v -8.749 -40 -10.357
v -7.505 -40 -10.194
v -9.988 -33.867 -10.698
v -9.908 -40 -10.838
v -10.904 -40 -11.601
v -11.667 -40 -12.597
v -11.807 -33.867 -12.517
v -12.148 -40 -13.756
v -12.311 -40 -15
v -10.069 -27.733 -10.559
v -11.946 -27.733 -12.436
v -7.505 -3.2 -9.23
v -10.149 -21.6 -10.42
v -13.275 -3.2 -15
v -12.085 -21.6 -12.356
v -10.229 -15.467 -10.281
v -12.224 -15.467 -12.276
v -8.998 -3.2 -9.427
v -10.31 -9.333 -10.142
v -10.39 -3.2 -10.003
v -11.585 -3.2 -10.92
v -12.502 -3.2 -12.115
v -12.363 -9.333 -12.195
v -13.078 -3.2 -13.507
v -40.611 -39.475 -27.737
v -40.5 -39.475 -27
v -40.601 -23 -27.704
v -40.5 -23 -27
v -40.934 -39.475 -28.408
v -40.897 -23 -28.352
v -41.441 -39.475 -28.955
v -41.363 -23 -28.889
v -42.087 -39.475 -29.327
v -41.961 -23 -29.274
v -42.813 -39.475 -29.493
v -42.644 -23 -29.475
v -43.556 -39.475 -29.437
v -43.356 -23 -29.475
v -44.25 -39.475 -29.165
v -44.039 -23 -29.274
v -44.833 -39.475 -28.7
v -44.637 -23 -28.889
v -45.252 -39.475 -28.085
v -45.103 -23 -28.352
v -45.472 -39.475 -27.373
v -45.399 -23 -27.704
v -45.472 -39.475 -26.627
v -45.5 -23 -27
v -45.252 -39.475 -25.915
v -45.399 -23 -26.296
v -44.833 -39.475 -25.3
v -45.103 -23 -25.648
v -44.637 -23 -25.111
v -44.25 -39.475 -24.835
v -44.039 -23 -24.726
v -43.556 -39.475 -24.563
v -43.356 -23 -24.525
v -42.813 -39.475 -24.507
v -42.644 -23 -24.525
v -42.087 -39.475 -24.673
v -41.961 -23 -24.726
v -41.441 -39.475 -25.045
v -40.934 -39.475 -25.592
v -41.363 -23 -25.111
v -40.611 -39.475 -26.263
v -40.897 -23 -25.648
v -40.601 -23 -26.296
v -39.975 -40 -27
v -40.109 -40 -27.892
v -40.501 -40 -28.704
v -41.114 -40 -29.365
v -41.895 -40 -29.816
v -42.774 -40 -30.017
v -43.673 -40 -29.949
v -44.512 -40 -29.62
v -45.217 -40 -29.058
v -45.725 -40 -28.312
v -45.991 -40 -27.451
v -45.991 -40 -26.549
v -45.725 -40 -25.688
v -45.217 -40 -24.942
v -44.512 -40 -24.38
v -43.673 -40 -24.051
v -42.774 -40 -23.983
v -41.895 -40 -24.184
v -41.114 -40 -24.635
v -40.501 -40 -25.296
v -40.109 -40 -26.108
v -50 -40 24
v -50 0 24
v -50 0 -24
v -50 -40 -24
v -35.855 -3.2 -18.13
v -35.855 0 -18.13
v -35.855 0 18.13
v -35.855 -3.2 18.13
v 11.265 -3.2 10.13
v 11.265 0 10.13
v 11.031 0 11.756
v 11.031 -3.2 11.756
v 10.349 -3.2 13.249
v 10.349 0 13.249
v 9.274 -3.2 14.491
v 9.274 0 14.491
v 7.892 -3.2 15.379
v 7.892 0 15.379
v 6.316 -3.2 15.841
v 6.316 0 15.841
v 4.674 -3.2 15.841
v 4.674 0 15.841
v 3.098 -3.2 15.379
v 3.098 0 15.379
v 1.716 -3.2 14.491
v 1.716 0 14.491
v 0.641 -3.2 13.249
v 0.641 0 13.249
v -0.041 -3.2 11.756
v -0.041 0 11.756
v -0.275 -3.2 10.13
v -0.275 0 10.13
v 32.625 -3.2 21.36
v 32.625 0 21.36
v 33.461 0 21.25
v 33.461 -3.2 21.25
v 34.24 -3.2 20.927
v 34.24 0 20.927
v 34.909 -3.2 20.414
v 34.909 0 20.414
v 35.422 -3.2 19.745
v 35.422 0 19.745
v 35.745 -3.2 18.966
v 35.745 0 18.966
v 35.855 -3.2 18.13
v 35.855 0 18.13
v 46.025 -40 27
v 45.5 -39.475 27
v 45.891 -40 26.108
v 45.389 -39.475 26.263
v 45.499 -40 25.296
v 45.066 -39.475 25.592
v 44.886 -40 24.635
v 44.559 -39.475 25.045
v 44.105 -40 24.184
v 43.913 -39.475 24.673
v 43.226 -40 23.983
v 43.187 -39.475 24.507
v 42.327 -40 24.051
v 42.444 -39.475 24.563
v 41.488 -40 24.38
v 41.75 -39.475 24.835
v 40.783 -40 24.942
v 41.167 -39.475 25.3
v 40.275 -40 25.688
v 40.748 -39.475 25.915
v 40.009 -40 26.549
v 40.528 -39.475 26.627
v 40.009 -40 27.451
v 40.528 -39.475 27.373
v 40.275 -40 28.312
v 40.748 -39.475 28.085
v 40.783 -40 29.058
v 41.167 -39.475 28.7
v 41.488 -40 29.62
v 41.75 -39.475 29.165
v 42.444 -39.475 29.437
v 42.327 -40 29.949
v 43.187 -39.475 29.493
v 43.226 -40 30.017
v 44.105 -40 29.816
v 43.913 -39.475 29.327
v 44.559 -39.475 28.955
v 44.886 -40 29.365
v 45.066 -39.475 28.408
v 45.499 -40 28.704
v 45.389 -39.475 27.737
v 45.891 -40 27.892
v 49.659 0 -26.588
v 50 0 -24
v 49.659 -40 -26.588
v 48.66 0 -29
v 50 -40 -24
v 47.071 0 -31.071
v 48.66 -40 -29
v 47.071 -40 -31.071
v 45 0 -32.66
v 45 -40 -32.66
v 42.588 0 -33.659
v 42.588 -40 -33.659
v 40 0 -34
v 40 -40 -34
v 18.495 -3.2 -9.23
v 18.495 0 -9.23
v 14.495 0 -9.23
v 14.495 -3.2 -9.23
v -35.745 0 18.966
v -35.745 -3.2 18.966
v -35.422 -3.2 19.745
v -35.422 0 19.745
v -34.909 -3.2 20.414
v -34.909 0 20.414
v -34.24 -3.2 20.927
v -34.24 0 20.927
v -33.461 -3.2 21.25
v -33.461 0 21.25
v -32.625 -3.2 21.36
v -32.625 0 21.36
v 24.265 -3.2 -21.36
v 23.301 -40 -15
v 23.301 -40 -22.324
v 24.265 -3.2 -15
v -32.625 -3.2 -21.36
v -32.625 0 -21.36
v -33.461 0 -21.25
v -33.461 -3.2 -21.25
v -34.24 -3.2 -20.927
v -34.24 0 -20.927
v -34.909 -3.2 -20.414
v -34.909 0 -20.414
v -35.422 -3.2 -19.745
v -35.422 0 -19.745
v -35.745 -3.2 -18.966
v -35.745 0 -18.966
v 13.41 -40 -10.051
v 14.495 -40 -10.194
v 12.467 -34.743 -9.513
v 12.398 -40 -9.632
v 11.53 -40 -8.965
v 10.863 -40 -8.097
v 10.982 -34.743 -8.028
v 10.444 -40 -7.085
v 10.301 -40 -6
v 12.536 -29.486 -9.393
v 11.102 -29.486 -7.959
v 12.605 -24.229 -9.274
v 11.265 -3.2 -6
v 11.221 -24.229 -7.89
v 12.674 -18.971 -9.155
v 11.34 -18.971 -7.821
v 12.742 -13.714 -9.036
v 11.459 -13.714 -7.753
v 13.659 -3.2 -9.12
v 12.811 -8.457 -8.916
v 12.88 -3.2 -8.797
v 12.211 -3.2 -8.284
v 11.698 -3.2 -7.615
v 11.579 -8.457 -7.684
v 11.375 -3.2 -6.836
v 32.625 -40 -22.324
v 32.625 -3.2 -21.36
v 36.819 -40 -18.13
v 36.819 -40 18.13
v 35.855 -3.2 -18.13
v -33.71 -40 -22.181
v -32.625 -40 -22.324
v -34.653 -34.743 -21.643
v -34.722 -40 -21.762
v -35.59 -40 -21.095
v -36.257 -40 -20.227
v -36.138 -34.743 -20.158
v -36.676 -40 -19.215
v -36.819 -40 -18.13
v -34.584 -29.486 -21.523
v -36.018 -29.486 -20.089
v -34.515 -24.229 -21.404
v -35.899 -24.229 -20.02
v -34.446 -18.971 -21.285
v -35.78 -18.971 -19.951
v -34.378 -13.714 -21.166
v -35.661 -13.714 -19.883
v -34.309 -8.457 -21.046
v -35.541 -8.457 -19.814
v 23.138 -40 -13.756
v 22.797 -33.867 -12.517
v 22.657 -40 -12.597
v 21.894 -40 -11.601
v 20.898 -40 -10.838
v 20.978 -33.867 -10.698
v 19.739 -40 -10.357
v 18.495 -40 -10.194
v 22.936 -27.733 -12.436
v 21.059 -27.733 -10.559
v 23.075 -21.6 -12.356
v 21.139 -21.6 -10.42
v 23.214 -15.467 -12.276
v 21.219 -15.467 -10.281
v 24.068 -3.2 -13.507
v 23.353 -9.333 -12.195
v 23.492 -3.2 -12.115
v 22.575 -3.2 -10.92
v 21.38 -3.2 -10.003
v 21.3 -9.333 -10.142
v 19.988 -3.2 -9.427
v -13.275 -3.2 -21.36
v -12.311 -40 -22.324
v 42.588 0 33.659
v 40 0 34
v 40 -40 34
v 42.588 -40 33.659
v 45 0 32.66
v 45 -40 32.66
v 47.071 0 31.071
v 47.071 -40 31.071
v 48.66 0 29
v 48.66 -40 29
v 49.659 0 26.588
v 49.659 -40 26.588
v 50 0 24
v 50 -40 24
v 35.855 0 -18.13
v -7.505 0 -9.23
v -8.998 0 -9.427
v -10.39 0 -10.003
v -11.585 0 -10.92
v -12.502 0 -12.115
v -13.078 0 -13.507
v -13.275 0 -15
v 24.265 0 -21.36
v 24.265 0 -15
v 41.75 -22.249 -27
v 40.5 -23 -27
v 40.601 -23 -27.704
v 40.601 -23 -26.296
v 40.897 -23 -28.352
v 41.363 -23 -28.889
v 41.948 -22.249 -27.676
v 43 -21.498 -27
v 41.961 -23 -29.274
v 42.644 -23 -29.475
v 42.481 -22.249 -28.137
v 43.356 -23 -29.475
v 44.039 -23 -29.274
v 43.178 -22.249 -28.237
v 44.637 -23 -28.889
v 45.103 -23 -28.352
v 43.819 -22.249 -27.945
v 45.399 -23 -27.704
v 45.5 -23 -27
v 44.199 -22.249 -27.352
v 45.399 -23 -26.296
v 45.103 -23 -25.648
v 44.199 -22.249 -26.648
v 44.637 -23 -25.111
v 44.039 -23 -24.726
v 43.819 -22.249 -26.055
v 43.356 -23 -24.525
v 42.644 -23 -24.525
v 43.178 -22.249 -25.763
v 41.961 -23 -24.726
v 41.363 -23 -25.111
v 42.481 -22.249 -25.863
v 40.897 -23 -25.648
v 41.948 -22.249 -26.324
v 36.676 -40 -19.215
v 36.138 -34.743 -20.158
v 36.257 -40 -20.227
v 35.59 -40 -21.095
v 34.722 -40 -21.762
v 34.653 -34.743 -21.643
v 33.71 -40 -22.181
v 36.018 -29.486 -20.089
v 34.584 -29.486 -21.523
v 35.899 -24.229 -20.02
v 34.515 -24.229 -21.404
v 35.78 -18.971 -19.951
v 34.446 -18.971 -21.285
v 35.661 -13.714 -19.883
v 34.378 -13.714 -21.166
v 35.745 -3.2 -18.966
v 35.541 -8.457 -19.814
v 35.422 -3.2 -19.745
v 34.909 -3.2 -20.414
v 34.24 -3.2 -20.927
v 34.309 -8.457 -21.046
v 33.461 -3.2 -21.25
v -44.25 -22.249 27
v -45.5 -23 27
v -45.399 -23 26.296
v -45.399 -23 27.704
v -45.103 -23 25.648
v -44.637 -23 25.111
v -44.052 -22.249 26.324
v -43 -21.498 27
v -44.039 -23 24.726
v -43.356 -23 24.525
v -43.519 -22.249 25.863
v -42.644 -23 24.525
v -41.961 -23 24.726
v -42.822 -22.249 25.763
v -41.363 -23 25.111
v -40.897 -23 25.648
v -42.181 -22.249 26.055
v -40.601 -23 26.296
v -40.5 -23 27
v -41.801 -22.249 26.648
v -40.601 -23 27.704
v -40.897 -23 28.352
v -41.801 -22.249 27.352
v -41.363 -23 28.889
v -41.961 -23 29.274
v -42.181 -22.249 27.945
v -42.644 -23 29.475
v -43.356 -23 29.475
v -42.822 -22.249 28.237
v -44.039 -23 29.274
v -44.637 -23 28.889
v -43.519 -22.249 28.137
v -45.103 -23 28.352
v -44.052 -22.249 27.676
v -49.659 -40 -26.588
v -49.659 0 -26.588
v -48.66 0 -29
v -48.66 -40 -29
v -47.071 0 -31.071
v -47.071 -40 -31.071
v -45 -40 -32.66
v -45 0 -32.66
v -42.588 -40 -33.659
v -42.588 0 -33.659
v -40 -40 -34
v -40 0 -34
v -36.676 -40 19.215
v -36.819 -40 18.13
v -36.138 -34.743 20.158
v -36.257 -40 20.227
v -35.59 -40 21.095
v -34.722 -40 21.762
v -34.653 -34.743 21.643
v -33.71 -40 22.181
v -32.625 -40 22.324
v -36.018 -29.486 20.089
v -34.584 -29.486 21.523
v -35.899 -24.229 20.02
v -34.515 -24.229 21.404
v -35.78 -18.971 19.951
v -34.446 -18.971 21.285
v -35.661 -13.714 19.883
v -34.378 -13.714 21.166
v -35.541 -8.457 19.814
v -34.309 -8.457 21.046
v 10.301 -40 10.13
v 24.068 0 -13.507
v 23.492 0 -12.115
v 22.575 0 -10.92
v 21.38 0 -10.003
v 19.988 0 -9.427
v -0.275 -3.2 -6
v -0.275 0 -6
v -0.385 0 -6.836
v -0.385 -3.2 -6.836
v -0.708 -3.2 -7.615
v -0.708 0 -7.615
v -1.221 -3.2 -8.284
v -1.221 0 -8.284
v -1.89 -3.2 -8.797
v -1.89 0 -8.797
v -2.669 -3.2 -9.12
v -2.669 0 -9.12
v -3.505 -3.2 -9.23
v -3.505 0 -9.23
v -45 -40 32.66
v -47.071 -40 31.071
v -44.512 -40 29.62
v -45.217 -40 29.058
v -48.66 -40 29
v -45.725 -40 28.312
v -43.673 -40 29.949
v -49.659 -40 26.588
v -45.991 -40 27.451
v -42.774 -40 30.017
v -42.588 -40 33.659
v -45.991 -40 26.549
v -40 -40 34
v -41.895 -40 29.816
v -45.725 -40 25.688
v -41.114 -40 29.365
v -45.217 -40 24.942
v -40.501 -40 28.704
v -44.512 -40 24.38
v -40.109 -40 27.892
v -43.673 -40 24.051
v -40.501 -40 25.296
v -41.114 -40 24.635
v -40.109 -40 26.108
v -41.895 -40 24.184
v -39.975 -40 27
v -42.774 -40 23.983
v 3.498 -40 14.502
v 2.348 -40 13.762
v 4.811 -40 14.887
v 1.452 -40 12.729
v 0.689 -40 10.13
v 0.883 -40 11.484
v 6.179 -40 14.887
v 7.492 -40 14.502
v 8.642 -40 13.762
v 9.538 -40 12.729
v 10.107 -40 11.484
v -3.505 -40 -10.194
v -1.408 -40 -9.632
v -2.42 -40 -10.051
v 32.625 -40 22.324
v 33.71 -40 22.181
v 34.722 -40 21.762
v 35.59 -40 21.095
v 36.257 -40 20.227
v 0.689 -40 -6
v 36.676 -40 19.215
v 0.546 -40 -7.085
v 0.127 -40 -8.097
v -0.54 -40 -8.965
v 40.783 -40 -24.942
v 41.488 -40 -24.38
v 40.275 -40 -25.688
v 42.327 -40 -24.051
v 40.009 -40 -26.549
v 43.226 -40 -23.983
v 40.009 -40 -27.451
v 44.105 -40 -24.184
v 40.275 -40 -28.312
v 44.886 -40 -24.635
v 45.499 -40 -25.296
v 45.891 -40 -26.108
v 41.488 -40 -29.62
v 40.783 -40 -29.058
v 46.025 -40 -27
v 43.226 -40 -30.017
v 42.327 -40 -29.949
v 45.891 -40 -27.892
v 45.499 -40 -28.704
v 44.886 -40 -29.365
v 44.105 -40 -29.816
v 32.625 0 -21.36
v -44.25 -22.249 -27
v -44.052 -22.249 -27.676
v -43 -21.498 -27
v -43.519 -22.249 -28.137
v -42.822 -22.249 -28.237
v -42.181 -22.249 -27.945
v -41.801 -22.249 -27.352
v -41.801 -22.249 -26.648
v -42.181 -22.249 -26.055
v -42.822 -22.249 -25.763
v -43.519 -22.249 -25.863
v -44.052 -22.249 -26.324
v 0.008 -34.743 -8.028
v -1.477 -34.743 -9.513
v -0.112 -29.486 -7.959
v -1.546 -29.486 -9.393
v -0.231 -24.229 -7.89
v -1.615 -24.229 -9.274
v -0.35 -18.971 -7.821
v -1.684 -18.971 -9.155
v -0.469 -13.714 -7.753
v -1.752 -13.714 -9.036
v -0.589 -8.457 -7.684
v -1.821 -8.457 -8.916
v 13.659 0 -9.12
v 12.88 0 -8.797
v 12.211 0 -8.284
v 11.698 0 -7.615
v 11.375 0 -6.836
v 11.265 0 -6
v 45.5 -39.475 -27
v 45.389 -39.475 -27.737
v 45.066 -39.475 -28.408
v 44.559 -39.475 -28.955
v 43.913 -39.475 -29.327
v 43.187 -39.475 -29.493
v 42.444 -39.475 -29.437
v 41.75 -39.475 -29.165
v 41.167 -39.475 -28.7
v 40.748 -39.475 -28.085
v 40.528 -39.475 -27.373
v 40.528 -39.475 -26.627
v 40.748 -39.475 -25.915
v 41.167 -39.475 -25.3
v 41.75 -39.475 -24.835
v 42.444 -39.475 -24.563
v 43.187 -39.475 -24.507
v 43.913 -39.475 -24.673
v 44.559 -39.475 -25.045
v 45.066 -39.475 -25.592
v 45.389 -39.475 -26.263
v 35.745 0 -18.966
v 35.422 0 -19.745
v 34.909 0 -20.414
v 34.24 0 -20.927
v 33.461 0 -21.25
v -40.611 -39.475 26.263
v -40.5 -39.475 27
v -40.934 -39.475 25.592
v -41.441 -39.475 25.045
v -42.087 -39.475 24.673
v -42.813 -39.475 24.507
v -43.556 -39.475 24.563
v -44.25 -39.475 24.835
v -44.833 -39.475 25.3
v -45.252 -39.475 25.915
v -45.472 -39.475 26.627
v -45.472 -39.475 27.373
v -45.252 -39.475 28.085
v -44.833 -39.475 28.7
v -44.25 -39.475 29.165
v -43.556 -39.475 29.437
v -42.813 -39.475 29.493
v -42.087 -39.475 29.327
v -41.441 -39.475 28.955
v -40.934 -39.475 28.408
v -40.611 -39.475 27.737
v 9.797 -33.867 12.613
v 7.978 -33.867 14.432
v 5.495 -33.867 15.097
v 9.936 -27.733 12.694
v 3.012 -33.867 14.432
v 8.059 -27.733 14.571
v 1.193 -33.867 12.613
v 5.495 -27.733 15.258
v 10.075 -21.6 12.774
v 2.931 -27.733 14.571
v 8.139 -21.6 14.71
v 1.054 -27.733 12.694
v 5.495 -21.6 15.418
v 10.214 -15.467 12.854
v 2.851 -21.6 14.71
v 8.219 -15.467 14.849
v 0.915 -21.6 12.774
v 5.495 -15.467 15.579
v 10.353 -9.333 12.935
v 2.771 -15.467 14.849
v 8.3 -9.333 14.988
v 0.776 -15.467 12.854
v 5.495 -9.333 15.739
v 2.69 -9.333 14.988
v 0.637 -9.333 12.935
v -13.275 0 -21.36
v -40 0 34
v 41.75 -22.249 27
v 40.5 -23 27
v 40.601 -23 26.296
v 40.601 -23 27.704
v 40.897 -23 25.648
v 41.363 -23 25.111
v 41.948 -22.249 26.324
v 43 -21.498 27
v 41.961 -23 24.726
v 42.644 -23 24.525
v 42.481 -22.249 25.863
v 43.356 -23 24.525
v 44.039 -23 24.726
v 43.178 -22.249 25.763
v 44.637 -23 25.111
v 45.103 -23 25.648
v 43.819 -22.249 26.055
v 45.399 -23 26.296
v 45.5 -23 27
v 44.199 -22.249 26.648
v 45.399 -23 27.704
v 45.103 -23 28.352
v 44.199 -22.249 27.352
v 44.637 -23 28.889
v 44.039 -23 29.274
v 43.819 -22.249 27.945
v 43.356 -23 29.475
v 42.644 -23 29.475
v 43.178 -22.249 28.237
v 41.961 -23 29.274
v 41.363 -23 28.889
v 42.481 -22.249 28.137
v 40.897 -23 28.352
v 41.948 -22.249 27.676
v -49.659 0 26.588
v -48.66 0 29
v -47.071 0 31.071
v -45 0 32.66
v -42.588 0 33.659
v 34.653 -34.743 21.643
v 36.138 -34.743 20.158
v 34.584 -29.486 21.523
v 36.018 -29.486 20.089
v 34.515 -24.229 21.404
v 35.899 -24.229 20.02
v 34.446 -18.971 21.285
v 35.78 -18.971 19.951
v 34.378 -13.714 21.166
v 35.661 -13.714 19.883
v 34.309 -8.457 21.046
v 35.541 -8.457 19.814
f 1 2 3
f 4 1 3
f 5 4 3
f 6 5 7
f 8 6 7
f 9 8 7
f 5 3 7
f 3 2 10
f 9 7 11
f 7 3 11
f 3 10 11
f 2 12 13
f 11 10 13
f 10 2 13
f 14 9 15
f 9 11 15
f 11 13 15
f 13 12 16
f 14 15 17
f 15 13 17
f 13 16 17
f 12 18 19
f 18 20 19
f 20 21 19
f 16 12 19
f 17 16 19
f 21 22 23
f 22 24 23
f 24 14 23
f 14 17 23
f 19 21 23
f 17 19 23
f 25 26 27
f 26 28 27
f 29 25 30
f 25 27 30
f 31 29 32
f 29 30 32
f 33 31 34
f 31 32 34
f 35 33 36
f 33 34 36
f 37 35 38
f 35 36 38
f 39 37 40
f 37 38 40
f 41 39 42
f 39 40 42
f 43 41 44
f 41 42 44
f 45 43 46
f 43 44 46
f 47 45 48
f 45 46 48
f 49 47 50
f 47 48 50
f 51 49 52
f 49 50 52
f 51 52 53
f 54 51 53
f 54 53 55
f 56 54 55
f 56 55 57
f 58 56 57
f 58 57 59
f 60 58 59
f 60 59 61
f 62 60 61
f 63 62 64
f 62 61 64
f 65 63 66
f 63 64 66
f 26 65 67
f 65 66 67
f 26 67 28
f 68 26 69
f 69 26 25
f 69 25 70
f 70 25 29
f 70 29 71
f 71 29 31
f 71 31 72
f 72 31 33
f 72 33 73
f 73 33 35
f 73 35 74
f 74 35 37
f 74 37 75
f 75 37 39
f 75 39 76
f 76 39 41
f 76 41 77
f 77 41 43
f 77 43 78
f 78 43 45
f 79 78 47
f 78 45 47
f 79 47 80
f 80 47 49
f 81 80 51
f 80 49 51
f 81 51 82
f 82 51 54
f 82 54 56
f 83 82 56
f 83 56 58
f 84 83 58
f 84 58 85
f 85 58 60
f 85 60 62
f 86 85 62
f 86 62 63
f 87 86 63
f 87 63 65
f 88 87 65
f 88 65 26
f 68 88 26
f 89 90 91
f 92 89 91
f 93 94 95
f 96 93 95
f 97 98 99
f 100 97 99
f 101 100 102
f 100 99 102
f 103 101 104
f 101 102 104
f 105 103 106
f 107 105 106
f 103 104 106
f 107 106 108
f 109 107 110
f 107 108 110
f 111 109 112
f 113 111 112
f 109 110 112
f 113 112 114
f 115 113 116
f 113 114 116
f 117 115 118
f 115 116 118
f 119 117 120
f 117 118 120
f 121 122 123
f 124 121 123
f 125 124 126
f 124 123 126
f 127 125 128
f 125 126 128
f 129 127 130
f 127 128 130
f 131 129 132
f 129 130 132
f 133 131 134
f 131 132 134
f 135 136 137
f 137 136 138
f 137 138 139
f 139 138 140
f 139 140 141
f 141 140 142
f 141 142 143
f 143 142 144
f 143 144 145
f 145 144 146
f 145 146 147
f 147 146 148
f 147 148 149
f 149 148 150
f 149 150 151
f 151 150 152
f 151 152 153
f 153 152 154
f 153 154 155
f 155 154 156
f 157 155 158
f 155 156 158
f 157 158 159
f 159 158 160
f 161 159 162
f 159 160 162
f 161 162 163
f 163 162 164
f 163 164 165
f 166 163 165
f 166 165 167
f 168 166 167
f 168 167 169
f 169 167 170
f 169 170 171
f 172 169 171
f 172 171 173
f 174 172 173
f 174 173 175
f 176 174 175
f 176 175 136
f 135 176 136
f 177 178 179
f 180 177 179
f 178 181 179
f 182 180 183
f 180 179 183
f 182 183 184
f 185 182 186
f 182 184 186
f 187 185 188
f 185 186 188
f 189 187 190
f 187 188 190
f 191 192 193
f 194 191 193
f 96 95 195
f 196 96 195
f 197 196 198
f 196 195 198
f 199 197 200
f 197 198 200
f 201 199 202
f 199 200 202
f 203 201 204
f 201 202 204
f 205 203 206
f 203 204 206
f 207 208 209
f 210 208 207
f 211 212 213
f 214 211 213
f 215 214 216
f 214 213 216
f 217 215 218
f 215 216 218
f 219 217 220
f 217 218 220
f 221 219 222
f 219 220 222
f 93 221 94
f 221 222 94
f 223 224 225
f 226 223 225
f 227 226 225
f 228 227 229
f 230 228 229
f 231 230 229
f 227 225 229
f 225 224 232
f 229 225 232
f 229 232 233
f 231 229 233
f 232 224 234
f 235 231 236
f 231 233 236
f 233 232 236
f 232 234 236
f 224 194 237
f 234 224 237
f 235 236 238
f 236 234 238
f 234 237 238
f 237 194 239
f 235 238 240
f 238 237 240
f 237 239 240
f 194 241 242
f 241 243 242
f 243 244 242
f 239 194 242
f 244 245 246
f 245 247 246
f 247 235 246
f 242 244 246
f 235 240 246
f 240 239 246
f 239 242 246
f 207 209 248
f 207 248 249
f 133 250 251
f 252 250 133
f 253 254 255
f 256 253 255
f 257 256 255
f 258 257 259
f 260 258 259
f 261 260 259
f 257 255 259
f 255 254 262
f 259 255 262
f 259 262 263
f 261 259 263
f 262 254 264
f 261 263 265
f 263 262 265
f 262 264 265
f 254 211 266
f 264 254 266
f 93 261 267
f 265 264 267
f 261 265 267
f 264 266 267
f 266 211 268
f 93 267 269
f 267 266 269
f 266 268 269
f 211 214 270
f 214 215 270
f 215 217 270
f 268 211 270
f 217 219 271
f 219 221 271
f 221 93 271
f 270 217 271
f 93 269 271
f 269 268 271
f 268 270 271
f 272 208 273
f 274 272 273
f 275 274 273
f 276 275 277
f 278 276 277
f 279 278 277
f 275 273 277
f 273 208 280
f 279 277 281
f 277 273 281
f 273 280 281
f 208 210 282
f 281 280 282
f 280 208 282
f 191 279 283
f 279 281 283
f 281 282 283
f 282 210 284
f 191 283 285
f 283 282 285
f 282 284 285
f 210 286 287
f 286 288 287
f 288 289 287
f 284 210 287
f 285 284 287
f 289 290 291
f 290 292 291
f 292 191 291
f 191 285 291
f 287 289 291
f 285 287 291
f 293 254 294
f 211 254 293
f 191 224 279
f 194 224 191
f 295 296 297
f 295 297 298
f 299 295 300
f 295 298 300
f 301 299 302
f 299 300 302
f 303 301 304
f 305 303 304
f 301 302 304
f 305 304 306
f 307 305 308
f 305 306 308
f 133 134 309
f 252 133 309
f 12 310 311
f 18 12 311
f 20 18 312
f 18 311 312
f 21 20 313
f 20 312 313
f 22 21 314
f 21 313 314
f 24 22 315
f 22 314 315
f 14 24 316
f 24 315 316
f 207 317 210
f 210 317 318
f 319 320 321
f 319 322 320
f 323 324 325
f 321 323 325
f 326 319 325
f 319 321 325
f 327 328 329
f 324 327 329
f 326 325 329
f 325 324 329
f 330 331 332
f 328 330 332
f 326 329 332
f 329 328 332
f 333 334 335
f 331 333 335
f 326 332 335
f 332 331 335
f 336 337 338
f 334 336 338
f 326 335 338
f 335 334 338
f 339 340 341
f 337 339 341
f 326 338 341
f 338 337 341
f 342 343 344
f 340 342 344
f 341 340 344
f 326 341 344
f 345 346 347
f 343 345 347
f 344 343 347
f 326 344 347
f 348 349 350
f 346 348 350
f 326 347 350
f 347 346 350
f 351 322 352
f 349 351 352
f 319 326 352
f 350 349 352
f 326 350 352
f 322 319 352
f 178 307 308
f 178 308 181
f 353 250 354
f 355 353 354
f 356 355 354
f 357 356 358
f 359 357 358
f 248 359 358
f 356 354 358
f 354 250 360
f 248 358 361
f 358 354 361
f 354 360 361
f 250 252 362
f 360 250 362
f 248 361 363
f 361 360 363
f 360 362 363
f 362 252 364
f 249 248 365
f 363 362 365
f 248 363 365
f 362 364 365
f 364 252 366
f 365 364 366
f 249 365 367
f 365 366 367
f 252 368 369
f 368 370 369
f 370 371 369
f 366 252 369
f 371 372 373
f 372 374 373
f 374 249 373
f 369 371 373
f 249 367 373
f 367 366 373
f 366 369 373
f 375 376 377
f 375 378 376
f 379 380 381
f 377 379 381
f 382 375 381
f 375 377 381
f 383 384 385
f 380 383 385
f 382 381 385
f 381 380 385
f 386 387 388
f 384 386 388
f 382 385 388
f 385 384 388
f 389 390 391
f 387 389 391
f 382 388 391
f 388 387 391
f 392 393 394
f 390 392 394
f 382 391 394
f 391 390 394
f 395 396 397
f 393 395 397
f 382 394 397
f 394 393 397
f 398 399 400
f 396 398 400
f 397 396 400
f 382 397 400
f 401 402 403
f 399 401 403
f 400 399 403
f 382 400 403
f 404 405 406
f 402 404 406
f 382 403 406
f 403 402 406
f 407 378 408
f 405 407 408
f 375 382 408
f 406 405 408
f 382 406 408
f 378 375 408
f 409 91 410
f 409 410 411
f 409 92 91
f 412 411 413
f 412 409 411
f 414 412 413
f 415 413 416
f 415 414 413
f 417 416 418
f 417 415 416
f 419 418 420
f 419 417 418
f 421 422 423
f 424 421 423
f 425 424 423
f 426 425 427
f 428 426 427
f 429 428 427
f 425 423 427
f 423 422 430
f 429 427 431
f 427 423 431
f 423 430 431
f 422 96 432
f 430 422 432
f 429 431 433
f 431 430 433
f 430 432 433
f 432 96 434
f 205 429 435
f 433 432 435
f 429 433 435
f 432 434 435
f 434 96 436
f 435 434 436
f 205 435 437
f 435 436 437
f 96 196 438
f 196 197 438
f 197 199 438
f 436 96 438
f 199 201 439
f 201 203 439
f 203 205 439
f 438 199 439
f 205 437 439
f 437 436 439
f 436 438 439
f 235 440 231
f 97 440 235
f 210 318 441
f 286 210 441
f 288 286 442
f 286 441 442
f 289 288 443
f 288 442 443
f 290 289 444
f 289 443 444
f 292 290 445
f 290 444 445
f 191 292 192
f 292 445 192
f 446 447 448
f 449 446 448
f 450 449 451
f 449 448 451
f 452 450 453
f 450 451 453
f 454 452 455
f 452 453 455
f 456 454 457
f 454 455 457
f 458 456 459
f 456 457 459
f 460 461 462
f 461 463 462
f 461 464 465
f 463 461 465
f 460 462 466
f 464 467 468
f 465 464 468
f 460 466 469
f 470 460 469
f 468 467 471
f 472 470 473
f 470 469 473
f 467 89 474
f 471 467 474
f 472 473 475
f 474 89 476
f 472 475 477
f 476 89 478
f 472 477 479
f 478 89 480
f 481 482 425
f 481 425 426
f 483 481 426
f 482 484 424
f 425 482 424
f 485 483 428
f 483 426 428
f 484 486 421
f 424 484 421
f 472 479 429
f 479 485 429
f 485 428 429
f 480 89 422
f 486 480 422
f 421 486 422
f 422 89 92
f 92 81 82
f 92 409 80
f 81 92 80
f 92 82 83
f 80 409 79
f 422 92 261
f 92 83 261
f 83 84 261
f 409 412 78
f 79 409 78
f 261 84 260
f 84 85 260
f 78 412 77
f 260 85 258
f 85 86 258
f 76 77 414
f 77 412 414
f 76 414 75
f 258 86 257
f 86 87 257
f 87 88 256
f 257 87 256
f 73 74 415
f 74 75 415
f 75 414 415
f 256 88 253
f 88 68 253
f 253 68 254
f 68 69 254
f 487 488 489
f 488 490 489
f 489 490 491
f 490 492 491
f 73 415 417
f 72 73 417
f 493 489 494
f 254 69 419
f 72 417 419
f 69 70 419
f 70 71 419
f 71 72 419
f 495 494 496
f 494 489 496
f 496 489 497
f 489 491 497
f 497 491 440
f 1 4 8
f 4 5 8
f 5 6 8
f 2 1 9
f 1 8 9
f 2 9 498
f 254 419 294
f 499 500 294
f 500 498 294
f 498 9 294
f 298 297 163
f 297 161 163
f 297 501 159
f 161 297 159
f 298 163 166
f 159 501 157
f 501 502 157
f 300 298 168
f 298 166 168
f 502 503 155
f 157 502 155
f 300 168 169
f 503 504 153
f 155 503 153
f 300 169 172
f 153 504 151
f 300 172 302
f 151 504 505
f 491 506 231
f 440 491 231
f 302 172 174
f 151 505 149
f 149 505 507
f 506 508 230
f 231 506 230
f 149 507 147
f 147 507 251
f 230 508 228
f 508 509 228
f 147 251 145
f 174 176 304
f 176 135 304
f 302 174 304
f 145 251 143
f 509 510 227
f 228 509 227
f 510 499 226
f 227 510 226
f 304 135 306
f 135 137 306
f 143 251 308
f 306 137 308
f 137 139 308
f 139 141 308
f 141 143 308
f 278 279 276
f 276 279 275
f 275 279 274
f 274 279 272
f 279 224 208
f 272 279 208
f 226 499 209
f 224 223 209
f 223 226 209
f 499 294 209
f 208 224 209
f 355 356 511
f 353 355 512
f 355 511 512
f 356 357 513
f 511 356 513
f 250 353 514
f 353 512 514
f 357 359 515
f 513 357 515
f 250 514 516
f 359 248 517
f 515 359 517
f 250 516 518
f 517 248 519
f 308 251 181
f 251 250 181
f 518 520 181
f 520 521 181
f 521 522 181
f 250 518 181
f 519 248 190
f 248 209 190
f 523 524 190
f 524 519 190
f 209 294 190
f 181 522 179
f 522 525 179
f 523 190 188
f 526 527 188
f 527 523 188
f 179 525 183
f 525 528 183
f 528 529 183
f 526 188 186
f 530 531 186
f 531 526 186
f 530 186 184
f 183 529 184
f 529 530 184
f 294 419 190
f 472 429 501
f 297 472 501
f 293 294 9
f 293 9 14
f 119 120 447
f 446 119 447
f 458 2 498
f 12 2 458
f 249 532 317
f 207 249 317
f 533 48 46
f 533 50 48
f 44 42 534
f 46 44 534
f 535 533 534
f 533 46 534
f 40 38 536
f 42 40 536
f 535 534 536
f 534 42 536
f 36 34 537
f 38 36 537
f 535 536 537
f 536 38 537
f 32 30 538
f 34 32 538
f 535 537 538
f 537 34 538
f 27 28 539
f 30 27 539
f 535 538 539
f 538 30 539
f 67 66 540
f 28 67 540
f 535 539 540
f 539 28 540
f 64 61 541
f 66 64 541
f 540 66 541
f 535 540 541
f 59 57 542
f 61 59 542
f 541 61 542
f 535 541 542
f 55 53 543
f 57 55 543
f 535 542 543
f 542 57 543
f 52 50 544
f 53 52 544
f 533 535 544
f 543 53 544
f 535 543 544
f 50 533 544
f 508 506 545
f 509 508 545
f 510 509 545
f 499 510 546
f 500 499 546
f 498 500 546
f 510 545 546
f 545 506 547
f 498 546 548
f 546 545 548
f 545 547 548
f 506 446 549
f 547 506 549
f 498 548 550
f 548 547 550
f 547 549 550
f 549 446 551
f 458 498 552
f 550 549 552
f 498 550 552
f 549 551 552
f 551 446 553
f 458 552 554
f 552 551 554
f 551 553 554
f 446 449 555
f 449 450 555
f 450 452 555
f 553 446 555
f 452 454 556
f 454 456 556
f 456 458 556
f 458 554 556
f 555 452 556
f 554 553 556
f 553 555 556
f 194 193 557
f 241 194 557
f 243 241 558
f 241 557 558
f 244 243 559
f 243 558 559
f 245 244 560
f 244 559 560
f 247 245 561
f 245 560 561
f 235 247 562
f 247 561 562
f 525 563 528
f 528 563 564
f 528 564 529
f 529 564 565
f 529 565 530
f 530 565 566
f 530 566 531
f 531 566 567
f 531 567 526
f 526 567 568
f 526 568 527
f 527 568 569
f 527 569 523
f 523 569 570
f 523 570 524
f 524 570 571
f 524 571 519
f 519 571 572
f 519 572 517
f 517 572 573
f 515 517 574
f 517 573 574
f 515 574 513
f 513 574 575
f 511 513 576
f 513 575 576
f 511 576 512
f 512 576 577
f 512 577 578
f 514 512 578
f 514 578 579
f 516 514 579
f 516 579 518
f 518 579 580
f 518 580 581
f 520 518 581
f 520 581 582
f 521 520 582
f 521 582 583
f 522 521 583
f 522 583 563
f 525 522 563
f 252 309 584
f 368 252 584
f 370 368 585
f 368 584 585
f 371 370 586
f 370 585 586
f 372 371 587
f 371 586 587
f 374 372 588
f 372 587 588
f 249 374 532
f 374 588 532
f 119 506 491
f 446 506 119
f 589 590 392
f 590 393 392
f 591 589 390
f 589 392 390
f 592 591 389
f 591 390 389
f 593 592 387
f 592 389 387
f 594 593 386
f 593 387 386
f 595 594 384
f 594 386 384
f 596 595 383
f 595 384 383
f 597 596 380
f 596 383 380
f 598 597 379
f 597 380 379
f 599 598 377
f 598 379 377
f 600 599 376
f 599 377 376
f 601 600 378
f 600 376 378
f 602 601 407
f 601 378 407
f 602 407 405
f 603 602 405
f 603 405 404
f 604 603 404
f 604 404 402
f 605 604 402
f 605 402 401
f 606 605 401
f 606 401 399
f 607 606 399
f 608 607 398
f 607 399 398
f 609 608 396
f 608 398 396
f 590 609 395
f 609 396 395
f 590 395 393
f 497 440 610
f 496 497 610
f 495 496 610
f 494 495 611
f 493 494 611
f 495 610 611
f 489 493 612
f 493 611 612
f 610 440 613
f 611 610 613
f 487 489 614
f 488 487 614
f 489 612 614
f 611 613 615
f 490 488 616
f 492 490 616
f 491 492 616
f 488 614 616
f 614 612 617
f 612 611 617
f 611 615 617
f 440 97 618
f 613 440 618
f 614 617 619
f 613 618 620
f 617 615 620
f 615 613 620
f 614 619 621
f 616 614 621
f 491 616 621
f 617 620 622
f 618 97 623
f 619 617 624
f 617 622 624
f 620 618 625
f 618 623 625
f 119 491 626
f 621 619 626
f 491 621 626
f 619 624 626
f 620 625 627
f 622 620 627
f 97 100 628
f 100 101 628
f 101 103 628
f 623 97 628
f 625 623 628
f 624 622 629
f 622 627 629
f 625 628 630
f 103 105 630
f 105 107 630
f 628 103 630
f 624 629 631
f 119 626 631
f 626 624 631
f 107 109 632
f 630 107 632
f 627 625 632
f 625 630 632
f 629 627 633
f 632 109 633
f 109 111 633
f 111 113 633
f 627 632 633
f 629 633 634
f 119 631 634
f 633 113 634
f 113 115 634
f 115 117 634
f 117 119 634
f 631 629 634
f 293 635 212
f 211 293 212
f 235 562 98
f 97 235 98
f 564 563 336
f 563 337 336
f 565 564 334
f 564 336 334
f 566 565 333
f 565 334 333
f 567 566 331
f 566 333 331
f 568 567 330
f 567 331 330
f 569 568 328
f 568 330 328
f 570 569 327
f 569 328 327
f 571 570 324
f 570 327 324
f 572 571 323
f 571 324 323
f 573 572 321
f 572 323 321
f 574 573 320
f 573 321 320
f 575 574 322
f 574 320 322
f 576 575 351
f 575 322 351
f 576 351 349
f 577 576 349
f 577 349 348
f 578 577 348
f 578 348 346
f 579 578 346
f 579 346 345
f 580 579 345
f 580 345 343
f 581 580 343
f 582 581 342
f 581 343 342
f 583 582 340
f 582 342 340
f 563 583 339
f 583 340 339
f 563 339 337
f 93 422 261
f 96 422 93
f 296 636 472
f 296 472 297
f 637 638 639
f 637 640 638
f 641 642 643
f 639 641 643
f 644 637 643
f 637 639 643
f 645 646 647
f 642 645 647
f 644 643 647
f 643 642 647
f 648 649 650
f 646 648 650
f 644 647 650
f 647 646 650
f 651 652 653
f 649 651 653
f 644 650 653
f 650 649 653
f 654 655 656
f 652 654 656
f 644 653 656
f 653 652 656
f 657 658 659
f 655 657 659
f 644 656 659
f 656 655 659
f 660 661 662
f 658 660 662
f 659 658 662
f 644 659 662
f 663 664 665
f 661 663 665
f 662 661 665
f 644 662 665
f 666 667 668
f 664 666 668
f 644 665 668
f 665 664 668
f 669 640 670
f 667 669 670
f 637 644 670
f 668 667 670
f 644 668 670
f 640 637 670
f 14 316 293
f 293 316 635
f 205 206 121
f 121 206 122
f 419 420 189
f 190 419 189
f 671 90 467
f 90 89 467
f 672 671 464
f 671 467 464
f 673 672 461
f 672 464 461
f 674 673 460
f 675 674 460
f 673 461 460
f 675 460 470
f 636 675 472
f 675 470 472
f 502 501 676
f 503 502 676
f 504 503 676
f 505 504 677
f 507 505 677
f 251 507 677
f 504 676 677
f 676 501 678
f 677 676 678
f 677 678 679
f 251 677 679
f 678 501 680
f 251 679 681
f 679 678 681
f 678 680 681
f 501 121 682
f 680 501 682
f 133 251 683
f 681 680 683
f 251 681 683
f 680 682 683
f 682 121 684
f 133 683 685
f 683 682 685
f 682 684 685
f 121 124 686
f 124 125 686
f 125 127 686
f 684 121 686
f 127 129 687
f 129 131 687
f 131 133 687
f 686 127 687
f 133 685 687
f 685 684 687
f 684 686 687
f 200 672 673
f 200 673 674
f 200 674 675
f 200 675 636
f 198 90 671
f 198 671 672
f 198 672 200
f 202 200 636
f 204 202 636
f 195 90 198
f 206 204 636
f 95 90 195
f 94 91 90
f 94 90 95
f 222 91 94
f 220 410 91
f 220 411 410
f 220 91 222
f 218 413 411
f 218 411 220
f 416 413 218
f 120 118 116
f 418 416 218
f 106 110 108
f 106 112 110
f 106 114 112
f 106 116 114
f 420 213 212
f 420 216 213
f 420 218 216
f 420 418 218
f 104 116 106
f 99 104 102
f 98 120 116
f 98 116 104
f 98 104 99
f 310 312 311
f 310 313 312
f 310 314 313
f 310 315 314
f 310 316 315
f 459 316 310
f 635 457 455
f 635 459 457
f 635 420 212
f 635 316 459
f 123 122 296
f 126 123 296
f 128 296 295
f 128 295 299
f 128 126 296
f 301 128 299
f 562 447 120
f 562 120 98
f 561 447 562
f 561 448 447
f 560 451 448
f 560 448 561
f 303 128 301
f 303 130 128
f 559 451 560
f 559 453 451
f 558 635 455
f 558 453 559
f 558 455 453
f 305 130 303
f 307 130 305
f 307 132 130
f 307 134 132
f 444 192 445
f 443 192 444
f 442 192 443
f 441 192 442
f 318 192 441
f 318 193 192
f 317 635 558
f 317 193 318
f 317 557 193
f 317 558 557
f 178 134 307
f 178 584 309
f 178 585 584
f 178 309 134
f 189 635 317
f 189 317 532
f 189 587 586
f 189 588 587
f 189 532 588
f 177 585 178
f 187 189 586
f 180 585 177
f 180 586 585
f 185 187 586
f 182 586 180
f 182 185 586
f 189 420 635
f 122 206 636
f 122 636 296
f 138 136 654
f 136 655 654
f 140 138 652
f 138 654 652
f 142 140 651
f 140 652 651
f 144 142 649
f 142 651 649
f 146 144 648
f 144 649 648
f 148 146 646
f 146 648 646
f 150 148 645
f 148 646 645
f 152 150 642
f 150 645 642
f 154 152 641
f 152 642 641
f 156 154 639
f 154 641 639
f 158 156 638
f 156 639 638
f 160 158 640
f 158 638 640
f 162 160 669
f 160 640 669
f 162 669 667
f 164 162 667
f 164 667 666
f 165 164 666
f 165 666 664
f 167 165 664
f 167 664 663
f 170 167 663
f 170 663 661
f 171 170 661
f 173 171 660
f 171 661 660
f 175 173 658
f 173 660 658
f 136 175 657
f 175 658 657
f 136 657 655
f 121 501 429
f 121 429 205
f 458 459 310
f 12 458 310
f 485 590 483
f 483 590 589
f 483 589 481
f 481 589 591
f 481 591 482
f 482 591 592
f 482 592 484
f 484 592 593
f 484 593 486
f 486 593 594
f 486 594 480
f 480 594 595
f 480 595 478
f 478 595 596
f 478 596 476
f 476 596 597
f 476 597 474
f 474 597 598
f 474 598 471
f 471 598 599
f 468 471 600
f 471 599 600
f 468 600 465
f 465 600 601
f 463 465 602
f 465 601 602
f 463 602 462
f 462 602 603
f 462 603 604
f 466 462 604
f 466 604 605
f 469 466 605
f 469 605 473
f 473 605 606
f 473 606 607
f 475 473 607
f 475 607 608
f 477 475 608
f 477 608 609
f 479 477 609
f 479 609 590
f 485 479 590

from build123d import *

# Parameters (mm, degrees)
SKETCH1_W                   = 100
SKETCH1_H                   = 68
BOSS_EXTRUDE1_DEPTH         = 40
FILLET1_R                   = 10
CUT_EXTRUDE1_REACH          = 74.498
M6_TAPPED_HOLE1_D           = 5
M6_TAPPED_HOLE1_DEPTH       = 17
M6_TAPPED_HOLE1_CSINK_D     = 6.05
M6_TAPPED_HOLE1_CSINK_ANGLE = 90
M6_TAPPED_HOLE1_TIP         = 1.502151548


with BuildPart() as part:
    # Sketch1 → Boss-Extrude1 (new body)
    with BuildSketch(Plane(origin=(0, 0, 0), x_dir=(1, 0, 0), z_dir=(0, 1, 0))):
        Rectangle(SKETCH1_W, SKETCH1_H)
    extrude(amount=-BOSS_EXTRUDE1_DEPTH)

    # Fillet1
    fillet1_edges = [part.edges().sort_by_distance(p)[0] for p in [
        (50, -20, 34),
        (-50, -20, 34),
        (-50, -20, -34),
        (50, -20, -34),
    ]]
    fillet(fillet1_edges, radius=FILLET1_R)

    # Sketch2 → Cut-Extrude1 (cut, up to next)
    with BuildSketch(Plane(origin=(0, 0, 0), x_dir=(1, 0, 0), z_dir=(0, 1, 0)), mode=Mode.PRIVATE) as cut_extrude1_sk1:
        with BuildLine():
            Line((-32.625, -21.36), (32.625, -21.36))
            ThreePointArc((32.625, -21.36), (34.908954903, -20.413954903), (35.855, -18.13))
            Line((35.855, -18.13), (35.855, 18.13))
            ThreePointArc((35.855, 18.13), (34.908954903, 20.413954903), (32.625, 21.36))
            Line((32.625, 21.36), (24.265, 21.36))
            Line((24.265, 21.36), (24.265, 15))
            ThreePointArc((24.265, 15), (22.575006127, 10.919993873), (18.495, 9.23))
            Line((18.495, 9.23), (14.495, 9.23))
            ThreePointArc((14.495, 9.23), (12.211045097, 8.283954903), (11.265, 6))
            Line((11.265, 6), (11.265, -10.13))
            ThreePointArc((11.265, -10.13), (5.495, -15.9), (-0.275, -10.13))
            Line((-0.275, -10.13), (-0.275, 6))
            ThreePointArc((-0.275, 6), (-1.221045097, 8.283954903), (-3.505, 9.23))
            Line((-3.505, 9.23), (-7.505, 9.23))
            ThreePointArc((-7.505, 9.23), (-11.585006127, 10.919993873), (-13.275, 15))
            Line((-13.275, 15), (-13.275, 21.36))
            Line((-13.275, 21.36), (-32.625, 21.36))
            ThreePointArc((-32.625, 21.36), (-34.908954903, 20.413954903), (-35.855, 18.13))
            Line((-35.855, 18.13), (-35.855, -18.13))
            ThreePointArc((-35.855, -18.13), (-34.908954903, -20.413954903), (-32.625, -21.36))
        make_face()
    cut_extrude1_tool1 = extrude(cut_extrude1_sk1.sketch, amount=-CUT_EXTRUDE1_REACH, mode=Mode.PRIVATE) & part.part
    add(cut_extrude1_tool1.solids().sort_by_distance((-1.698637, 0, 2.611892))[0], mode=Mode.SUBTRACT)

    # Cut-Sweep1: sweep along a path in Sketch5
    with BuildLine(Plane(origin=(0, 0, 0), x_dir=(1, 0, 0), z_dir=(0, 1, 0))) as cut_sweep1_path:
        Line((-32.625, -21.36), (32.625, -21.36))
        ThreePointArc((32.625, -21.36), (34.908954903, -20.413954903), (35.855, -18.13))
        Line((35.855, -18.13), (35.855, 18.13))
        ThreePointArc((35.855, 18.13), (34.908954903, 20.413954903), (32.625, 21.36))
        Line((32.625, 21.36), (24.265, 21.36))
        Line((24.265, 21.36), (24.265, 15))
        ThreePointArc((24.265, 15), (22.575006127, 10.919993873), (18.495, 9.23))
        Line((18.495, 9.23), (14.495, 9.23))
        ThreePointArc((14.495, 9.23), (12.211045097, 8.283954903), (11.265, 6))
        Line((11.265, 6), (11.265, -10.13))
        ThreePointArc((11.265, -10.13), (5.495, -15.9), (-0.275, -10.13))
        Line((-0.275, -10.13), (-0.275, 6))
        ThreePointArc((-0.275, 6), (-1.221045097, 8.283954903), (-3.505, 9.23))
        Line((-3.505, 9.23), (-7.505, 9.23))
        ThreePointArc((-7.505, 9.23), (-11.585006127, 10.919993873), (-13.275, 15))
        Line((-13.275, 15), (-13.275, 21.36))
        Line((-13.275, 21.36), (-32.625, 21.36))
        ThreePointArc((-32.625, 21.36), (-34.908954903, 20.413954903), (-35.855, 18.13))
        Line((-35.855, 18.13), (-35.855, -18.13))
        ThreePointArc((-35.855, -18.13), (-34.908954903, -20.413954903), (-32.625, -21.36))
    # Sketch3 → Cut-Sweep1 (sweep, cut)
    with BuildSketch(Plane.XY):
        Polygon((35.855, -3.2), (36.818641914, -40), (34.855, -40), (34.855, -3.2), align=None)
    sweep(path=cut_sweep1_path.line, transition=Transition.RIGHT, mode=Mode.SUBTRACT)

    # M6 Tapped Hole1
    with Locations(Plane(origin=(0, -40, 0), x_dir=(-1, 0, 0), z_dir=(0, -1, 0))):
        with Locations((-43, 27), (43, 27), (43, -27), (-43, -27)):
            CounterSinkHole(M6_TAPPED_HOLE1_D / 2, M6_TAPPED_HOLE1_CSINK_D / 2, depth=M6_TAPPED_HOLE1_DEPTH, counter_sink_angle=M6_TAPPED_HOLE1_CSINK_ANGLE)
            with Locations((0, 0, -(M6_TAPPED_HOLE1_DEPTH + M6_TAPPED_HOLE1_TIP / 2))):  # 118° drill point
                Cone(0, M6_TAPPED_HOLE1_D / 2, M6_TAPPED_HOLE1_TIP, mode=Mode.SUBTRACT)


solid = part.part
